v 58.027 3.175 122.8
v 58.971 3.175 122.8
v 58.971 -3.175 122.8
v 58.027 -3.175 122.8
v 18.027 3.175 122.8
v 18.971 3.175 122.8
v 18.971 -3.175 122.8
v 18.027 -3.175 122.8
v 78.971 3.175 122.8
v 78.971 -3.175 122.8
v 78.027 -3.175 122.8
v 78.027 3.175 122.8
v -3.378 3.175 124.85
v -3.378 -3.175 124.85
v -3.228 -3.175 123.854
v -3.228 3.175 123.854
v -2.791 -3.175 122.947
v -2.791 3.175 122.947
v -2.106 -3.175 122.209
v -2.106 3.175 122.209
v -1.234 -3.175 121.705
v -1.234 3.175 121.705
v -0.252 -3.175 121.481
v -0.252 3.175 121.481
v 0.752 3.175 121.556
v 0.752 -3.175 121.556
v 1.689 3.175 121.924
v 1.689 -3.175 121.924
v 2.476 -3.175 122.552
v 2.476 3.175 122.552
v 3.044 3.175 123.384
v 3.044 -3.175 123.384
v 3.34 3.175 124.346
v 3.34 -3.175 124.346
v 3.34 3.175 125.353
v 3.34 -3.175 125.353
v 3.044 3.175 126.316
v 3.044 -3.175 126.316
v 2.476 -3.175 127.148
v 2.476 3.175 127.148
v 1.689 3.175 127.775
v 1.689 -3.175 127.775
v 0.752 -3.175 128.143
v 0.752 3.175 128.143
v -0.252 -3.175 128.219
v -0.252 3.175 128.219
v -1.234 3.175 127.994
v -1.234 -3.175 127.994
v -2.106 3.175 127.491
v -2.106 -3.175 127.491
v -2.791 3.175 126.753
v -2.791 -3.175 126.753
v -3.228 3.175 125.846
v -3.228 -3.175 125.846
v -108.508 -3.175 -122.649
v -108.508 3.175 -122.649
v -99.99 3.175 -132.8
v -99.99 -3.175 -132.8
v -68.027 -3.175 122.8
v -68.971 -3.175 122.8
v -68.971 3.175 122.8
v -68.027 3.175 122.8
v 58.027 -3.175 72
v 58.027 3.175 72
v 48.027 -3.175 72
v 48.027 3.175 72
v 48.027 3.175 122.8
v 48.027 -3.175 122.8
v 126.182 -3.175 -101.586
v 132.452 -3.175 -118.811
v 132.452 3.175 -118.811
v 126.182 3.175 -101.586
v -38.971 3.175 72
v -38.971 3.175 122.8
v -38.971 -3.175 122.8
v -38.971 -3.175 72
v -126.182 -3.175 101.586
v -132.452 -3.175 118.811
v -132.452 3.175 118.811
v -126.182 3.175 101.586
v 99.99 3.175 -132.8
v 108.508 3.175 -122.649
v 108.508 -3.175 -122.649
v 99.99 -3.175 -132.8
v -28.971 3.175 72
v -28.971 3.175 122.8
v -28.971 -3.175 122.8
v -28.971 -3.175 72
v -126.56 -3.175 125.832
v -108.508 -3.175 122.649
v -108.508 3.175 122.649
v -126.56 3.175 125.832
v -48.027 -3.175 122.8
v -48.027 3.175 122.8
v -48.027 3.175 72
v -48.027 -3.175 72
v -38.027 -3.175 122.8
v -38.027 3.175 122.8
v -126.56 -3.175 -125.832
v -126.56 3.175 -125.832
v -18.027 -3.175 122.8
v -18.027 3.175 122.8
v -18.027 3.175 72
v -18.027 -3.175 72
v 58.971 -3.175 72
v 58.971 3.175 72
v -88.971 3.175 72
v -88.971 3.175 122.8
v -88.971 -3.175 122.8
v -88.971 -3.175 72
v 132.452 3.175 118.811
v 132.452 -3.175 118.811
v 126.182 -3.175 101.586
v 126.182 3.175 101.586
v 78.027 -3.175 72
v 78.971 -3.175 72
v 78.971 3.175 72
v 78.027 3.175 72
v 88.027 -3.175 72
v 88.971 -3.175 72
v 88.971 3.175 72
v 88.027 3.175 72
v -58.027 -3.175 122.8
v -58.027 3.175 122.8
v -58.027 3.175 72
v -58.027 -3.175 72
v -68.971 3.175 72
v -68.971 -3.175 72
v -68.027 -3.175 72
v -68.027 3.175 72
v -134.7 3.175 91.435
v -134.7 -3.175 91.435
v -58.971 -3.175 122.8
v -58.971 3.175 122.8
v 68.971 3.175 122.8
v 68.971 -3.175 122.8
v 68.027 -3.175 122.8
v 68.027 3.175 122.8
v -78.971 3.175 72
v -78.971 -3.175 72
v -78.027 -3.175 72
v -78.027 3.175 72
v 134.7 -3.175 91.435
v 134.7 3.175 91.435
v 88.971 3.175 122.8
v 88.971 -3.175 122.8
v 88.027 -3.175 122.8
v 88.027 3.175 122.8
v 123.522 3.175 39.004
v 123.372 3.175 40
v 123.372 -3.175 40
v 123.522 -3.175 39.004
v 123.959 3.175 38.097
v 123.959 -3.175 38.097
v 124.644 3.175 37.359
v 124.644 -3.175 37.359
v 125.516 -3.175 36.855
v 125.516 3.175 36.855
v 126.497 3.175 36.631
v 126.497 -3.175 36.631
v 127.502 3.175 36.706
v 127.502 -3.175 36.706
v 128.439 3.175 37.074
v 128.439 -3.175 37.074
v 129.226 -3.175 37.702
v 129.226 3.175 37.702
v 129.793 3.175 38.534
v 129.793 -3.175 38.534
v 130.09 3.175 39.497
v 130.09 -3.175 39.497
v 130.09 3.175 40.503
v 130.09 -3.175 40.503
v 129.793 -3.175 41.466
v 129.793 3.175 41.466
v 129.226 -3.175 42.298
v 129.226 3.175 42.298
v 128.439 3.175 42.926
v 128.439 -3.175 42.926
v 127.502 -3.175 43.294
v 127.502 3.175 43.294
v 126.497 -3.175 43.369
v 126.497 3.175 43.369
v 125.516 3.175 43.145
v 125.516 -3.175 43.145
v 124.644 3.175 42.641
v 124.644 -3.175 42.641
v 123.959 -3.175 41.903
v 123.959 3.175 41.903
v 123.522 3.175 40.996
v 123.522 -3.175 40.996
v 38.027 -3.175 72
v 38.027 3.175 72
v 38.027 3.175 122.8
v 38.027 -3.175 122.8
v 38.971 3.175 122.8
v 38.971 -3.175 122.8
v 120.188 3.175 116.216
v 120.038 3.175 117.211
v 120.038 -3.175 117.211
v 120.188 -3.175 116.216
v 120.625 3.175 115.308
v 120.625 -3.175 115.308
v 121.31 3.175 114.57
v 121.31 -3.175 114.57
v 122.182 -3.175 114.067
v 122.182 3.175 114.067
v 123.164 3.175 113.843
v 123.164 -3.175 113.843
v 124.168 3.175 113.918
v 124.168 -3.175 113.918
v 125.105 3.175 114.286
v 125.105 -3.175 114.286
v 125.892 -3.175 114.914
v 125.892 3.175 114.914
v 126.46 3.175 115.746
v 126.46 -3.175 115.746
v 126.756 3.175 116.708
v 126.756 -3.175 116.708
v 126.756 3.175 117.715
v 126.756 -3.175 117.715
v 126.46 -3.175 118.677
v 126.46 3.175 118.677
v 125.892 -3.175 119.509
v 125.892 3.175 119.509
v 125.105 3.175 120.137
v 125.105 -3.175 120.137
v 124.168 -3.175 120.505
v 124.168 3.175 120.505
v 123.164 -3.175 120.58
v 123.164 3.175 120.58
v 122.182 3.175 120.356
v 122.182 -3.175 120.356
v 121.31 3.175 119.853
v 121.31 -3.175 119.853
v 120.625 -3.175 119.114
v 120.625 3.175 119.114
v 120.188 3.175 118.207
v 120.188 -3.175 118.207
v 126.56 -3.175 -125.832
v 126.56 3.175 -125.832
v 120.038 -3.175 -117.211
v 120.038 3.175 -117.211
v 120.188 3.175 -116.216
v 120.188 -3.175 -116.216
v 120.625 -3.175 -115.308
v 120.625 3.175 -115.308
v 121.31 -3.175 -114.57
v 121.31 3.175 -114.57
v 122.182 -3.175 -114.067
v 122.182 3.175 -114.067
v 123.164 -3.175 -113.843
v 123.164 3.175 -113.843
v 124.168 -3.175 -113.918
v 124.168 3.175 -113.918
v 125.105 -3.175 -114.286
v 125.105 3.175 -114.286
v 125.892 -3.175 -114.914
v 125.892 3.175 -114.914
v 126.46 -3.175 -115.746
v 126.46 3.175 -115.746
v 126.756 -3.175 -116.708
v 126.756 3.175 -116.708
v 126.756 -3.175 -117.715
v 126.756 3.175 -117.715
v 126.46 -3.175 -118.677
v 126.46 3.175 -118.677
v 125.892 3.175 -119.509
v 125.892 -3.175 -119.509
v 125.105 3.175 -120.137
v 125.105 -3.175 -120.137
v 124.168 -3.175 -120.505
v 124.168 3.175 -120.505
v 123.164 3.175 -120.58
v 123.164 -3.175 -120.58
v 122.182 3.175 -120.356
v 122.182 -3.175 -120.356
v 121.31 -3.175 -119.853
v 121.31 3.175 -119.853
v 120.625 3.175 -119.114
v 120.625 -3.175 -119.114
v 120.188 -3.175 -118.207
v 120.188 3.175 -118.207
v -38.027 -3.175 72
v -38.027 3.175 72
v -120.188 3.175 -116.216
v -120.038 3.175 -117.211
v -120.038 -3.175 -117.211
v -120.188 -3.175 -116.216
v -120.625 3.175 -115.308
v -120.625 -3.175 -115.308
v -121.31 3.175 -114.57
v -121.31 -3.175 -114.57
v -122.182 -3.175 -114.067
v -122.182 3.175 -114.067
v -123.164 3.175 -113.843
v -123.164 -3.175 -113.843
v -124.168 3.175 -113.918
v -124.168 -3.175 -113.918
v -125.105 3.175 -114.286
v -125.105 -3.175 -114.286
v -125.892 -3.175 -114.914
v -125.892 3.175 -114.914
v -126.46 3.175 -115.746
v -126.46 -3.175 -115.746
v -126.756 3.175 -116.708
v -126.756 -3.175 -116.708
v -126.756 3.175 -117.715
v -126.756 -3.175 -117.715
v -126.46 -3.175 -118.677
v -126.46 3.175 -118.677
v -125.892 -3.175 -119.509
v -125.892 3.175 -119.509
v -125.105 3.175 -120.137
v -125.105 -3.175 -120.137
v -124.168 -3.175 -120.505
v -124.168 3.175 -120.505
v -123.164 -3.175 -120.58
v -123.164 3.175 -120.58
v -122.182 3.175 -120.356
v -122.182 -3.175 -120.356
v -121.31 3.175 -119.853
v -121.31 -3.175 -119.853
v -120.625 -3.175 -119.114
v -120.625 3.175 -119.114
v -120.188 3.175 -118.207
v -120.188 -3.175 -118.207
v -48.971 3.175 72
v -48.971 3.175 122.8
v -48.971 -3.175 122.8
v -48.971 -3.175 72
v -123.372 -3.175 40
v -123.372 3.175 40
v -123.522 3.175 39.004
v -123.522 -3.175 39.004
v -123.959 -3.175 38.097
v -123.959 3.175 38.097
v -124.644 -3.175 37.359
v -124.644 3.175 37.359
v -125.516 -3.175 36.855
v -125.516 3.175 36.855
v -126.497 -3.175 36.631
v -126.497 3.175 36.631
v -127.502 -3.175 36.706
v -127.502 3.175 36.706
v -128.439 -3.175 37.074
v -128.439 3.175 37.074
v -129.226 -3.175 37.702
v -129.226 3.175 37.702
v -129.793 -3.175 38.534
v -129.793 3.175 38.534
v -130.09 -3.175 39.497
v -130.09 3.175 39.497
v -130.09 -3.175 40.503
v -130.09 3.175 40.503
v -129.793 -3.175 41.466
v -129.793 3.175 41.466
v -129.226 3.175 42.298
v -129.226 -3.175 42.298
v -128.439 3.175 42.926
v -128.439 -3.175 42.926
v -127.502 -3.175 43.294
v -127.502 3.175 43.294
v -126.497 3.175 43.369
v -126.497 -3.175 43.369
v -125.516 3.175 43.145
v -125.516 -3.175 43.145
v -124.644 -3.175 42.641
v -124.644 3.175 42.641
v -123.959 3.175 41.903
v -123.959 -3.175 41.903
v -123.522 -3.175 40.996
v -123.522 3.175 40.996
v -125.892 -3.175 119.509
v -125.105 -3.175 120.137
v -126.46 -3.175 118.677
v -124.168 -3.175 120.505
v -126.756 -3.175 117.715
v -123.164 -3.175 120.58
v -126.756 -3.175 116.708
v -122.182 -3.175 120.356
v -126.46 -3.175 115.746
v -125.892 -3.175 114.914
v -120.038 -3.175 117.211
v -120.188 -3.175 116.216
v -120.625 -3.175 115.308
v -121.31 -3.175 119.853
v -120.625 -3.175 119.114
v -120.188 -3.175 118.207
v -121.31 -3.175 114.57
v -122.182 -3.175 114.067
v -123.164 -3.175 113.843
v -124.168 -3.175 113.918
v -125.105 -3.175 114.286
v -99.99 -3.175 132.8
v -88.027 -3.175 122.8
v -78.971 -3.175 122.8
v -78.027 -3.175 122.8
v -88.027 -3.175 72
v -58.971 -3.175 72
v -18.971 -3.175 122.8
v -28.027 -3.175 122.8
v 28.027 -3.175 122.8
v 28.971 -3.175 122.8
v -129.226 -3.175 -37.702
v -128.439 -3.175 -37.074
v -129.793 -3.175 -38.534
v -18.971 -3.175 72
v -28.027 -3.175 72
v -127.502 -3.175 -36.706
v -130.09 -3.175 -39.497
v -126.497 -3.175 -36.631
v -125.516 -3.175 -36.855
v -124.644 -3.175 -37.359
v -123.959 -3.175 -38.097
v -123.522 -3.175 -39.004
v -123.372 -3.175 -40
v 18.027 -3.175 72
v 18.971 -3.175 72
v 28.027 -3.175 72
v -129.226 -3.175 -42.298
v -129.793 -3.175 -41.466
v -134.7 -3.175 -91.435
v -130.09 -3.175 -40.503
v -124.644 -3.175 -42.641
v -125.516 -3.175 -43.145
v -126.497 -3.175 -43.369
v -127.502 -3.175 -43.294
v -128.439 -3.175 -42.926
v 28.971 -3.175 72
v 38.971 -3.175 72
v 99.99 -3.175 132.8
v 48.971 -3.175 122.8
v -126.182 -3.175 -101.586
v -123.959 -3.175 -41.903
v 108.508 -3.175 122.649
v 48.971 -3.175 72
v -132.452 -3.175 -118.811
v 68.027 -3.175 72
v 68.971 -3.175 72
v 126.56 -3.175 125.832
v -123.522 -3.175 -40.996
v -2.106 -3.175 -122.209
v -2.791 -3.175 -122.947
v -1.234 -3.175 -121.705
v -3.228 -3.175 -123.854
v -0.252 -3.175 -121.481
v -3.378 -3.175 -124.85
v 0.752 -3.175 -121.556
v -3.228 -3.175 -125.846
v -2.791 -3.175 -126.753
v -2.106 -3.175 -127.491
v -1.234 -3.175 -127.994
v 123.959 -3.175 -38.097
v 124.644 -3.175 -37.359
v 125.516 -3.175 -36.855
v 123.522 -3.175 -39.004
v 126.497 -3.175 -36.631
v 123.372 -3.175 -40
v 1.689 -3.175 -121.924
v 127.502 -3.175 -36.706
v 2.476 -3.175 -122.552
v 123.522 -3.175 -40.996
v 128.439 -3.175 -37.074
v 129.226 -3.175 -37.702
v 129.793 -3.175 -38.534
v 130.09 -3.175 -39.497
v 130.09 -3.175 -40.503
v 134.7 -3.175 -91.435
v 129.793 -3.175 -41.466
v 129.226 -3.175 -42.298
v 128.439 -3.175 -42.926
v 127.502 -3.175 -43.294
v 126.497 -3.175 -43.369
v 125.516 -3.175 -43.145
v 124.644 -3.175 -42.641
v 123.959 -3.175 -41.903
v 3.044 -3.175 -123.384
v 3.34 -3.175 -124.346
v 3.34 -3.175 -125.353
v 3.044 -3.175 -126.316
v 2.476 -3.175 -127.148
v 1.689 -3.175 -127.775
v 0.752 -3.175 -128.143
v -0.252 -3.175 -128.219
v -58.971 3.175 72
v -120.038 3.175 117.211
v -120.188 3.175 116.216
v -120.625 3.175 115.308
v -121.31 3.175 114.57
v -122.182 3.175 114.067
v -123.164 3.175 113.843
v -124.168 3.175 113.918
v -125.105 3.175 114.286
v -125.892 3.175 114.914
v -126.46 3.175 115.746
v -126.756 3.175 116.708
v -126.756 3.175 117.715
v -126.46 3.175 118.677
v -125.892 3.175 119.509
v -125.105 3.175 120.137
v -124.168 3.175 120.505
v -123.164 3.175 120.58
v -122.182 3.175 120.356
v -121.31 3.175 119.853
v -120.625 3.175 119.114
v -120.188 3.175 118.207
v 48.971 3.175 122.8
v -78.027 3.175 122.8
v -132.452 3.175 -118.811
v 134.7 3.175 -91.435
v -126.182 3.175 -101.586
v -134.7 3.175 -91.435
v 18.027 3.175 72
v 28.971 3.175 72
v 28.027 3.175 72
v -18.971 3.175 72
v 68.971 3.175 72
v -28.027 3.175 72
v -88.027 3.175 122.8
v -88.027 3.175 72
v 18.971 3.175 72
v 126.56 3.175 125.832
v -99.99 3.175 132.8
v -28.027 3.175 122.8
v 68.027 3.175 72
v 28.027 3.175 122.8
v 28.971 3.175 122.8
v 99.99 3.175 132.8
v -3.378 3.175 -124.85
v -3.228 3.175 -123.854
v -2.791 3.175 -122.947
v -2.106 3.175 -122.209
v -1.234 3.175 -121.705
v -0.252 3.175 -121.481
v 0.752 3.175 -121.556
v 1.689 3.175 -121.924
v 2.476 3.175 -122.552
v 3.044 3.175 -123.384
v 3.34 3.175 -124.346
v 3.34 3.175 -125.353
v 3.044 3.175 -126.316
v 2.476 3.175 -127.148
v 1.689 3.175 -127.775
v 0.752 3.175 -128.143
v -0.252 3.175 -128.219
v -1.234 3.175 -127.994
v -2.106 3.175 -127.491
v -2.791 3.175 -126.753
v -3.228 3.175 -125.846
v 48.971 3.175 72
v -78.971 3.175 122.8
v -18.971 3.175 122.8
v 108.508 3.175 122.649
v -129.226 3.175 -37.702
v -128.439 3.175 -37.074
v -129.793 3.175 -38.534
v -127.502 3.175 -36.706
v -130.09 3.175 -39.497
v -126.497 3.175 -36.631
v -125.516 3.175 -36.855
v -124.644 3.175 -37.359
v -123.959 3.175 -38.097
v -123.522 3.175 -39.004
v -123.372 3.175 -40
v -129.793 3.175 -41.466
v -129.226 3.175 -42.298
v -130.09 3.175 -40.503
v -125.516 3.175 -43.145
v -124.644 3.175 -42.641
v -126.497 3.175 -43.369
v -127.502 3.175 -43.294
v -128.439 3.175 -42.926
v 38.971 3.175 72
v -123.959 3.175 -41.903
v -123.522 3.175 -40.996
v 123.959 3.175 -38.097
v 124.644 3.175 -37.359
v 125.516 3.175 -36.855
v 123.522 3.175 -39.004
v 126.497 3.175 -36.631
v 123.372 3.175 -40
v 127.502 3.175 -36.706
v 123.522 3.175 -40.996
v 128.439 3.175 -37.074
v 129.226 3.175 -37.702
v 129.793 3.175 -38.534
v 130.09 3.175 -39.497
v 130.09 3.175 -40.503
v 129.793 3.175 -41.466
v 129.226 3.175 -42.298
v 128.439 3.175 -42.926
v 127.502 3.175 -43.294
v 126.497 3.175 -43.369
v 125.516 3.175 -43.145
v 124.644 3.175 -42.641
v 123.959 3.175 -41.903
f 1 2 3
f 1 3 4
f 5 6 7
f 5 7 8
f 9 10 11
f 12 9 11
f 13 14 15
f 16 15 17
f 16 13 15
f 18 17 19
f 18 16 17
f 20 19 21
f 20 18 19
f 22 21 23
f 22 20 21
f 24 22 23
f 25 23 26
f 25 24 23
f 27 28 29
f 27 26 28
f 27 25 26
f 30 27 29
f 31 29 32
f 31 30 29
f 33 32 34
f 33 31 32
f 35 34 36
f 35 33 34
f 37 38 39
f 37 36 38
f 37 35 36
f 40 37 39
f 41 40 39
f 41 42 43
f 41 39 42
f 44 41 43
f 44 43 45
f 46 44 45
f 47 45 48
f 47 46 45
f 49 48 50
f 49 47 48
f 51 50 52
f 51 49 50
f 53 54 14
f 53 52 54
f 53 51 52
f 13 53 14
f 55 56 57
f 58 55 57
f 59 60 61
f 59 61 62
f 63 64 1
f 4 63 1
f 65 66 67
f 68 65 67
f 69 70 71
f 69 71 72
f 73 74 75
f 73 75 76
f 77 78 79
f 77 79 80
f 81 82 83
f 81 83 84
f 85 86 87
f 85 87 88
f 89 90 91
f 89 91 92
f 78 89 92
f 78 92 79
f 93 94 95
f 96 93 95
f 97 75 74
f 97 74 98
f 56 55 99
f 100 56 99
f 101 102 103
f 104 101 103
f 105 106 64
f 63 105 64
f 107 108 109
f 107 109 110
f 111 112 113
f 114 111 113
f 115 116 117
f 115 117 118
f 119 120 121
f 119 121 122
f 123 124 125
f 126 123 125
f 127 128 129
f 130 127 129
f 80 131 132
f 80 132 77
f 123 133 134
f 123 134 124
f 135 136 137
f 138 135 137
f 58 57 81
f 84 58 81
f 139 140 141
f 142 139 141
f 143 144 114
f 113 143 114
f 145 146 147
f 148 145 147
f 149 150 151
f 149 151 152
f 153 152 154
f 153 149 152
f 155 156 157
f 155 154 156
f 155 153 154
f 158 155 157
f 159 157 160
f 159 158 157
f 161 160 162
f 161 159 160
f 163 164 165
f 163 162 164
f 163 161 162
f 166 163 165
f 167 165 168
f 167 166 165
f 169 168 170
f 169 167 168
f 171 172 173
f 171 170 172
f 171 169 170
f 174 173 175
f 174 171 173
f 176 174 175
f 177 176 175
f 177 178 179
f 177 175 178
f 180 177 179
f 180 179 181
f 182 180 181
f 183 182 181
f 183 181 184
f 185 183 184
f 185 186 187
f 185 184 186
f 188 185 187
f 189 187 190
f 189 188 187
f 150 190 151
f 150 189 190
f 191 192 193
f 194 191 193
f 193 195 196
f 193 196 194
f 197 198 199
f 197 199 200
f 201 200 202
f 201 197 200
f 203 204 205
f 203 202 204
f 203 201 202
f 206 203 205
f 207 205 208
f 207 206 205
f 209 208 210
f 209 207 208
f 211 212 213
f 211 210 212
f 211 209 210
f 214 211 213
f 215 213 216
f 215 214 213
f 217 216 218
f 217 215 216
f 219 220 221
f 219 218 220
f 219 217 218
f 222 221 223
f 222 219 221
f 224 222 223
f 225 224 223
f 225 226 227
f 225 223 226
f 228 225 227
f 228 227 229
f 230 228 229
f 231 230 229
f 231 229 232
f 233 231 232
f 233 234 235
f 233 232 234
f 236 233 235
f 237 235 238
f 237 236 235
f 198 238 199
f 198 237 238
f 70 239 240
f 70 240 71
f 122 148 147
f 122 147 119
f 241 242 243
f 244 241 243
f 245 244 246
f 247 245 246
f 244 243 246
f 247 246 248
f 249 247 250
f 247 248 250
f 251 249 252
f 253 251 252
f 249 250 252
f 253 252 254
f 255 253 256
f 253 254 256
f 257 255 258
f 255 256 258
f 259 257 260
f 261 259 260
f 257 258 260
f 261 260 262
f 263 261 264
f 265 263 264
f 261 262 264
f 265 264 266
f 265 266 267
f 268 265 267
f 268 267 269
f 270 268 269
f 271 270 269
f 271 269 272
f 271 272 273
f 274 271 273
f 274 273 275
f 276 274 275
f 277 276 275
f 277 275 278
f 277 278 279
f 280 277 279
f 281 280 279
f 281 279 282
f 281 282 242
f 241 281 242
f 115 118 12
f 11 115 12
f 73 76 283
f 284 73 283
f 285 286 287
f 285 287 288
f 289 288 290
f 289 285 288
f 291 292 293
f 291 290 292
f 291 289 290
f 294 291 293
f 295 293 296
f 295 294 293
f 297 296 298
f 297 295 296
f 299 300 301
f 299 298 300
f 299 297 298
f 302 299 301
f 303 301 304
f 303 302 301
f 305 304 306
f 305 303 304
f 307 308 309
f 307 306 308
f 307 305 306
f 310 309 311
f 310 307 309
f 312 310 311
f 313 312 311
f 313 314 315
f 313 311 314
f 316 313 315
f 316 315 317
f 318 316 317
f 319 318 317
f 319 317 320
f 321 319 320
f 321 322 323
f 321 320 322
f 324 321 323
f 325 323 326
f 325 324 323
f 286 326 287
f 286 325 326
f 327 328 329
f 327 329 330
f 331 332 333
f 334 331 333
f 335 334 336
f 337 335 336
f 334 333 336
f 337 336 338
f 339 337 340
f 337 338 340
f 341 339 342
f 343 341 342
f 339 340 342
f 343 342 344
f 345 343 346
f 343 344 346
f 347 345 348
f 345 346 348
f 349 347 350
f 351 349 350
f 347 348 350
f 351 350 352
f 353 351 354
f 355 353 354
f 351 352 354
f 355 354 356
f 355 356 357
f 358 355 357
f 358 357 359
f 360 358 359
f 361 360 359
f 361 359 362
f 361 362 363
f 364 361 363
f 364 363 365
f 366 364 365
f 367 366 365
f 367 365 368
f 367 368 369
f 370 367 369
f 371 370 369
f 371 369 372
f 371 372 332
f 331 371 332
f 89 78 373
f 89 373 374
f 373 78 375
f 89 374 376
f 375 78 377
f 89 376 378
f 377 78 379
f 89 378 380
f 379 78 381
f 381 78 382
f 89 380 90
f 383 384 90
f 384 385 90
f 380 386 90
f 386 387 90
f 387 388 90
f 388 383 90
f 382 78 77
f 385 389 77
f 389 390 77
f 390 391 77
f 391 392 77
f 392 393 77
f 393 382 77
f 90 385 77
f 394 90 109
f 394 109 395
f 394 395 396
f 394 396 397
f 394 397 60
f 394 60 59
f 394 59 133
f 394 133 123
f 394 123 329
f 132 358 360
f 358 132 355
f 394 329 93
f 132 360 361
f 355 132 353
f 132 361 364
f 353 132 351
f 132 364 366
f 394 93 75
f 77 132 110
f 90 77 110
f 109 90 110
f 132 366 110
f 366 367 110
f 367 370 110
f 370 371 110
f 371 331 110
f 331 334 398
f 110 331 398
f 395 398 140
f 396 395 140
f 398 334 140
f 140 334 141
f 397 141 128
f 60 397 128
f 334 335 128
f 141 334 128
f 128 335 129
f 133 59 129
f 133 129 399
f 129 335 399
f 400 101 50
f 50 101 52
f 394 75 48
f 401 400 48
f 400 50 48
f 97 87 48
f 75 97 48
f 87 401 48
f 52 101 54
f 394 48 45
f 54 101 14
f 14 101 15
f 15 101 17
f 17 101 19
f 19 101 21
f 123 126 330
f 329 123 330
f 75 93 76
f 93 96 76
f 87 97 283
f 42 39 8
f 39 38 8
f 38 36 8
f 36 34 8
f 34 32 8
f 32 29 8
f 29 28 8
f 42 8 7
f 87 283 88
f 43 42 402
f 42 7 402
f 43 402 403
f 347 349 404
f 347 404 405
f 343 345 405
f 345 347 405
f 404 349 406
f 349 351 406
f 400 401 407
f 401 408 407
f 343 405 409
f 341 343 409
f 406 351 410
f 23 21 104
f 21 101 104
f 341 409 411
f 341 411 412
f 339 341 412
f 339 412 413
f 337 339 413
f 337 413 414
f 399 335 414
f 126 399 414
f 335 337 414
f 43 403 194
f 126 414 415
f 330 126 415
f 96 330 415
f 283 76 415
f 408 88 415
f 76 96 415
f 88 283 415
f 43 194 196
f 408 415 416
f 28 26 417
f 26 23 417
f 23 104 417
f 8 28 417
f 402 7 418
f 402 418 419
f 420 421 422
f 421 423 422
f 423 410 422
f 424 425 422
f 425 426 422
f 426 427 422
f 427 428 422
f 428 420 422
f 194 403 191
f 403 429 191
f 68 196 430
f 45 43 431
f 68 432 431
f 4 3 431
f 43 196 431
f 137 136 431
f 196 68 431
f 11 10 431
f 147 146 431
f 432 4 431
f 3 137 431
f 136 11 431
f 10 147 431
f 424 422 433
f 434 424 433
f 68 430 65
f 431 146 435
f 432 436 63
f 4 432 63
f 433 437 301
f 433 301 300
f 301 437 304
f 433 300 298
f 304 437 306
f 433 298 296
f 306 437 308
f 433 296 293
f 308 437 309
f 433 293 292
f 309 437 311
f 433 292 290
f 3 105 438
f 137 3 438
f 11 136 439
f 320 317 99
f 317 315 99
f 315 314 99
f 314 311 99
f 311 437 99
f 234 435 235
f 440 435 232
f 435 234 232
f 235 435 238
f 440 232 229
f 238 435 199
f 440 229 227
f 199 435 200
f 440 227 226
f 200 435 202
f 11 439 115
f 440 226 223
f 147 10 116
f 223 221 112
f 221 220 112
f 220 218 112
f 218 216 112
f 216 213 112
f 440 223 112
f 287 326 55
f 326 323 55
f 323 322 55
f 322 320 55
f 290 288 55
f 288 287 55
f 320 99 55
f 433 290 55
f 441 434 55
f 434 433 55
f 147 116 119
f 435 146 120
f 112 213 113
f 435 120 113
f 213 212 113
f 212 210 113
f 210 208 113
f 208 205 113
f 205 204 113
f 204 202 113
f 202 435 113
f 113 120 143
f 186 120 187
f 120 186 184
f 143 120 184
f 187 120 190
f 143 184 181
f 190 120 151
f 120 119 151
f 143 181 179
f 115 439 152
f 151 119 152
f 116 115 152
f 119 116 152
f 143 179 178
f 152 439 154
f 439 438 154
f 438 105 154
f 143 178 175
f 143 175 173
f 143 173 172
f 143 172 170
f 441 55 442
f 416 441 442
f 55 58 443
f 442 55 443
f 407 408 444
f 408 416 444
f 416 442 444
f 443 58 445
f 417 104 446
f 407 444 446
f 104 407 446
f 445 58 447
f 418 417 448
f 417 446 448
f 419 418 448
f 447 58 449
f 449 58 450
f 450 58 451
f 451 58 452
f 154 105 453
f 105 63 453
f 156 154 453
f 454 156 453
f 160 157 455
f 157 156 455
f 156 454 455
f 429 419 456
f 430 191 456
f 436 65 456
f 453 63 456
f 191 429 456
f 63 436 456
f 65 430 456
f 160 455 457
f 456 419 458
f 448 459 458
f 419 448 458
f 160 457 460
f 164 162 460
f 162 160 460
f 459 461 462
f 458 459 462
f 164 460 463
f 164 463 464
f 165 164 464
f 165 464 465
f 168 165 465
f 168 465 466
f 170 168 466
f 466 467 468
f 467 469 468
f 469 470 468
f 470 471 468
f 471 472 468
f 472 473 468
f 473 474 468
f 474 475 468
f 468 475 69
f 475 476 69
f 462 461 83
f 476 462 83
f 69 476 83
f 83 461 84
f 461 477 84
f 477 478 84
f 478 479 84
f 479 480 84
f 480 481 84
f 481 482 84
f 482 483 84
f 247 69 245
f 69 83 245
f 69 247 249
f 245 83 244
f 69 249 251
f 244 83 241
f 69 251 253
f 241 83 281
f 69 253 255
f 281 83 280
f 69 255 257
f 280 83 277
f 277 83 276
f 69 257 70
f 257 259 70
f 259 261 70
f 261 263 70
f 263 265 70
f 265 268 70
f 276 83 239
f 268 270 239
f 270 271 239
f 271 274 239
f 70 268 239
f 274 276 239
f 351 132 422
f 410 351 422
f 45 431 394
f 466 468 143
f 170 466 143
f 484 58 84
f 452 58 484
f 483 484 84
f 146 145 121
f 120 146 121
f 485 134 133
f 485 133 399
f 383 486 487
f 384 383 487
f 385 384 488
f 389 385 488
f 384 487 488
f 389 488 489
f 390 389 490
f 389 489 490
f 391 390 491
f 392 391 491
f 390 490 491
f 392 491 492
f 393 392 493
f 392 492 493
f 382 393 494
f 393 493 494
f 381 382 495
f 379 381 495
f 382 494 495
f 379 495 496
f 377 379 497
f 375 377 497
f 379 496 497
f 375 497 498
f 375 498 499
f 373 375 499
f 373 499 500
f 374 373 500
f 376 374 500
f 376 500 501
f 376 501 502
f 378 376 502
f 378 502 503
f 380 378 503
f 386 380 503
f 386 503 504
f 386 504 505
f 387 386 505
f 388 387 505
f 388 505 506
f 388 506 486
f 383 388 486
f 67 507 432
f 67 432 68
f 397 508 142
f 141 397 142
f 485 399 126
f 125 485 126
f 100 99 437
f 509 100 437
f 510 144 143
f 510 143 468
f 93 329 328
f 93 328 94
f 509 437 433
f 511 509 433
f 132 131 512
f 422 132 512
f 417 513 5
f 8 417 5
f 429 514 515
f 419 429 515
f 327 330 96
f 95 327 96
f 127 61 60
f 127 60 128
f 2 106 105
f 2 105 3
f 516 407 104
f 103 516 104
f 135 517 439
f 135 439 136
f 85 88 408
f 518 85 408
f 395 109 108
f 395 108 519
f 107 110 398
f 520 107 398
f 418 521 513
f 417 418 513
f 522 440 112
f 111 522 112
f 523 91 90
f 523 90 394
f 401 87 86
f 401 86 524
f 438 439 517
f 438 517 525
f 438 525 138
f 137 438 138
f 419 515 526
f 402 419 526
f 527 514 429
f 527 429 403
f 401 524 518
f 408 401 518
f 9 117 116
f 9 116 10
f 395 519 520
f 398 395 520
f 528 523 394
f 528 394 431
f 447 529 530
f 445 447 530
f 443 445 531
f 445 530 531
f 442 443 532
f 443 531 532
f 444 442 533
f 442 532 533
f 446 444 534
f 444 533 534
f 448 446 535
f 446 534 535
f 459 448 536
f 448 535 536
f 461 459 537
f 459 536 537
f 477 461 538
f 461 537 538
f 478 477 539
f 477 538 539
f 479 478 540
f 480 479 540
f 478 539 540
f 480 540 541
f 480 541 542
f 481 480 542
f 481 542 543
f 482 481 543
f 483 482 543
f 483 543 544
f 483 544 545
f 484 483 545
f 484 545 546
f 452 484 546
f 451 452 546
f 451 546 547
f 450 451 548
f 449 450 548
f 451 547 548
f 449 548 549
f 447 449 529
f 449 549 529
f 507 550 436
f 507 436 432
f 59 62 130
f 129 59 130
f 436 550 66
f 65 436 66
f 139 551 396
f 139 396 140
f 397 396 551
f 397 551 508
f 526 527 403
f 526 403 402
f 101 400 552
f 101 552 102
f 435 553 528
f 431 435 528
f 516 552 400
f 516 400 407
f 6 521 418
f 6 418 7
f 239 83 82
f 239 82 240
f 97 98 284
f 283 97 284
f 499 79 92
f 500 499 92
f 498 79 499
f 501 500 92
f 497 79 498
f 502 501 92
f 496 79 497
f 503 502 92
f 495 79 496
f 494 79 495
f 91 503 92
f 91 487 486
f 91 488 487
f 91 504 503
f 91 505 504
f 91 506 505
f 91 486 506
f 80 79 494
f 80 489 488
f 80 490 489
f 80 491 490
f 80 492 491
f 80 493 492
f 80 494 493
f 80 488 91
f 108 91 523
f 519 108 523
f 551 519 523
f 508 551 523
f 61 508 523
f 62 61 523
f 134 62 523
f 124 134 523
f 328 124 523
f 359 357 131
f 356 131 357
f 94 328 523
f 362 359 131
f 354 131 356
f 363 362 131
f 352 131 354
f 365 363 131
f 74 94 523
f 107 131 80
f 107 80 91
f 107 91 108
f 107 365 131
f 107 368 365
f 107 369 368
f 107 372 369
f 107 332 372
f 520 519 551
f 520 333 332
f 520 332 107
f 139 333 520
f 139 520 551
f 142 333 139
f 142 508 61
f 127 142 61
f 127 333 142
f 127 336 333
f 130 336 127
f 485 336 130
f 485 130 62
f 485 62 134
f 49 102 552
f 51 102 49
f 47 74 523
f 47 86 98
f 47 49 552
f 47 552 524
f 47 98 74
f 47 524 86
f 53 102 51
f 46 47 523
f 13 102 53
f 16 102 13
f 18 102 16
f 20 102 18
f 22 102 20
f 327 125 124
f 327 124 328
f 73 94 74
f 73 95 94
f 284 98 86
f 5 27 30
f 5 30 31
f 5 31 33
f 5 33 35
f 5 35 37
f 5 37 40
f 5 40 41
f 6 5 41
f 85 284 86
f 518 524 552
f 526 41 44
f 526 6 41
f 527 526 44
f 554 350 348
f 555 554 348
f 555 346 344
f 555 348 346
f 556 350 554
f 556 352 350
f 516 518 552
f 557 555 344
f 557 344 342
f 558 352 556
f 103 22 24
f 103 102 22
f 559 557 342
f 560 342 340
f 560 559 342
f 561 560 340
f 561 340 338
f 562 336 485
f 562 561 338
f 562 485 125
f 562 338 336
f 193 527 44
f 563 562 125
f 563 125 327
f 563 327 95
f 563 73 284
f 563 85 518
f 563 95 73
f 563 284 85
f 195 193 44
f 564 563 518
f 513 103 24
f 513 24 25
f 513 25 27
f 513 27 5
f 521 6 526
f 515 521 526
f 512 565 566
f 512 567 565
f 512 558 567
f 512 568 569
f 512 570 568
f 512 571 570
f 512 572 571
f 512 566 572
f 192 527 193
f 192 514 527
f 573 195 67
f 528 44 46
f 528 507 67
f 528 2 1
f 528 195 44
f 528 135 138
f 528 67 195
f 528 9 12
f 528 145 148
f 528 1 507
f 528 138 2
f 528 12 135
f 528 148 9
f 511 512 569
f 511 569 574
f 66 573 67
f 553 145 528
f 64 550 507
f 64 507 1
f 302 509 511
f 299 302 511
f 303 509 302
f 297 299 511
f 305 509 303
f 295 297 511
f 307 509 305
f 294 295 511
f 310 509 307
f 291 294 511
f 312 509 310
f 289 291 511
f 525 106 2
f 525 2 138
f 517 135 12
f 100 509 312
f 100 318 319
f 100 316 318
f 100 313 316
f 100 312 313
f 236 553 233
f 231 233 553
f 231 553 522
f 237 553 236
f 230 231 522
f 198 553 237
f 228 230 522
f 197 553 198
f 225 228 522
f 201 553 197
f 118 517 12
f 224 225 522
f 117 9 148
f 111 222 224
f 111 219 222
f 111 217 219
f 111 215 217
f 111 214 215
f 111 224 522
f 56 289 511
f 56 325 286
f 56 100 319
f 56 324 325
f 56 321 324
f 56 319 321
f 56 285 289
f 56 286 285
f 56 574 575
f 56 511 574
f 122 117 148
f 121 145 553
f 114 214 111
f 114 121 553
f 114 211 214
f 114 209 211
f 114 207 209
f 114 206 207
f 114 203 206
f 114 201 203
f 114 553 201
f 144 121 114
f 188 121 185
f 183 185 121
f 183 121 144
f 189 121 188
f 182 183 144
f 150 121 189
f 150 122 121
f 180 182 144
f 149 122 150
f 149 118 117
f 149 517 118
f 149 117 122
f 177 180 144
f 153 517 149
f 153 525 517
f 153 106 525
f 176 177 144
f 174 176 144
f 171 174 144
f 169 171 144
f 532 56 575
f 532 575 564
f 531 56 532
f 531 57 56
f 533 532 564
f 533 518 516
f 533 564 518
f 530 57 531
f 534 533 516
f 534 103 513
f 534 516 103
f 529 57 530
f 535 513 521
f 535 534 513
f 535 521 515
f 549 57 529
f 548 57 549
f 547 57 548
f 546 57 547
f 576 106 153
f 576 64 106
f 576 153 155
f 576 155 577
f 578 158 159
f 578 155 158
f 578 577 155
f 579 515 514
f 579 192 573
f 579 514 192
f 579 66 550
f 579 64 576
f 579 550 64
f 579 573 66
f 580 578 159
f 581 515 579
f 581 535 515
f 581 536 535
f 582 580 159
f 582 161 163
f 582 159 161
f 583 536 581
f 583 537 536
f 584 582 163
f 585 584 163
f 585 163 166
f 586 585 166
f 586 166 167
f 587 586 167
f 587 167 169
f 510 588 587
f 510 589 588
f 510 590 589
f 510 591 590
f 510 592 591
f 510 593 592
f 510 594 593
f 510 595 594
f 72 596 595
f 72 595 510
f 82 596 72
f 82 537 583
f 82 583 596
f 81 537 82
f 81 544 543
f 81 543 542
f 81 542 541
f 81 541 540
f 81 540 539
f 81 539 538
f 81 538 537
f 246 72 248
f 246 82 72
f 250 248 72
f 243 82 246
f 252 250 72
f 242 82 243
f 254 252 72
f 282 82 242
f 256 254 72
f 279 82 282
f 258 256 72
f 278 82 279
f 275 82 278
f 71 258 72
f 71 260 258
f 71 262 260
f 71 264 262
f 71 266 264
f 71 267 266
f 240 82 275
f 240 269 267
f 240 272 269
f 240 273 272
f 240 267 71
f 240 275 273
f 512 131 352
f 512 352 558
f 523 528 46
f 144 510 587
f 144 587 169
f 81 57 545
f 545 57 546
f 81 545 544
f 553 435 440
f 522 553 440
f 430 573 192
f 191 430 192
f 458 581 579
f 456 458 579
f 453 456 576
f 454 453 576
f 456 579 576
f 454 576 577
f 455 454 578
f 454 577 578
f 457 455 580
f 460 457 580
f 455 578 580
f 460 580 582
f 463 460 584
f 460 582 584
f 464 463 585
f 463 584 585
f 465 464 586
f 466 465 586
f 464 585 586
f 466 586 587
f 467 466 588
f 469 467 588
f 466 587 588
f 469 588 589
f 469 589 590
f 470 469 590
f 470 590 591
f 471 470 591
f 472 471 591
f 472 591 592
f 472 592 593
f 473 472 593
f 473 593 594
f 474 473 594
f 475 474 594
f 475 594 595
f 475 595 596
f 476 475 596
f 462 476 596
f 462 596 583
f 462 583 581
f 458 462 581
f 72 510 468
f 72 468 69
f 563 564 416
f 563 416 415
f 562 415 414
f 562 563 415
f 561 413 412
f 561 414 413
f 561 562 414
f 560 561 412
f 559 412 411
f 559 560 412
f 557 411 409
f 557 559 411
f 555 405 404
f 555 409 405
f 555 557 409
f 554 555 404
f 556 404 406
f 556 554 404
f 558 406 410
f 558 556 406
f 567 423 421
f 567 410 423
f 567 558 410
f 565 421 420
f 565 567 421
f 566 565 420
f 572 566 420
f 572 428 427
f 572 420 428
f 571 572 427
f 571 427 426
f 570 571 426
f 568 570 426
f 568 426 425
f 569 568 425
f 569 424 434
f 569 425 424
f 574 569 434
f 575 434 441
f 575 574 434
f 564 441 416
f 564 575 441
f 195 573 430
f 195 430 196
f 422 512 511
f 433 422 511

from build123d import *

# Parameters (mm, degrees)
SKETCH1_W               = 269.4
SKETCH1_H               = 265.6
BOSS_EXTRUDE1_DEPTH     = 3.175
CUT_EXTRUDE3_DEPTH      = 190.262390612
BOSS_EXTRUDE3_DEPTH     = 6.35
F_1_4_CLEARANCE_HOLE1_D = 6.7564
MIRROR2_COPY_1_DEPTH    = 6.35
MIRROR2_COPY_2_D        = 6.7564
CUT_EXTRUDE2_REACH      = 191.262
SKETCH15_W              = 0.944
SKETCH15_H              = 50.8
LPATTERN1_COUNT         = 8
LPATTERN1_PITCH         = 10
MIRROR3_COPY_1_REACH    = 191.262
MIRROR3_COPY_1_SKETCH_W = 0.944
MIRROR3_COPY_1_SKETCH_H = 50.8
MIRROR3_COPY_2_REACH    = 191.262
MIRROR3_COPY_2_SKETCH_W = 0.944
MIRROR3_COPY_2_SKETCH_H = 50.8
MIRROR3_COPY_3_REACH    = 191.262
MIRROR3_COPY_3_SKETCH_W = 0.944
MIRROR3_COPY_3_SKETCH_H = 50.8
MIRROR3_COPY_4_REACH    = 191.262
MIRROR3_COPY_4_SKETCH_W = 0.944
MIRROR3_COPY_4_SKETCH_H = 50.8
MIRROR3_COPY_5_REACH    = 191.262
MIRROR3_COPY_5_SKETCH_W = 0.944
MIRROR3_COPY_5_SKETCH_H = 50.8
MIRROR3_COPY_6_REACH    = 191.262
MIRROR3_COPY_6_SKETCH_W = 0.944
MIRROR3_COPY_6_SKETCH_H = 50.8
MIRROR3_COPY_7_REACH    = 191.262
MIRROR3_COPY_7_SKETCH_W = 0.944
MIRROR3_COPY_7_SKETCH_H = 50.8


with BuildPart() as part:
    # Sketch1 → Boss-Extrude1 (new, symmetric)
    with BuildSketch(Plane(origin=(0, 0, 0), x_dir=(1, 0, 0), z_dir=(0, 1, 0))):
        Rectangle(SKETCH1_W, SKETCH1_H)
    extrude(amount=BOSS_EXTRUDE1_DEPTH, both=True)

    # Sketch16 → Cut-Extrude3 (cut, through all)
    with BuildSketch(Plane(origin=(0, 3.175, 0), x_dir=(1, 0, 0), z_dir=(0, 1, 0))):
        Polygon((-134.7, 132.8), (-134.7, 91.434816919), (-99.990490133, 132.8), align=None)
        Polygon((99.990490133, 132.8), (134.7, 132.8), (134.7, 91.434816919), align=None)
        Polygon((134.7, -132.8), (134.7, -91.434816919), (99.990490133, -132.8), align=None)
        Polygon((-99.990490133, -132.8), (-134.7, -132.8), (-134.7, -91.434816919), align=None)
    extrude(amount=-CUT_EXTRUDE3_DEPTH, mode=Mode.SUBTRACT)

    # Sketch7 → Boss-Extrude3 (add)
    with BuildSketch(Plane(origin=(0, -3.175, 0), x_dir=(1, 0, 0), z_dir=(0, 1, 0))):
        Polygon((126.560486405, 125.832227239), (132.451914797, 118.811096288), (126.182387654, 101.585712032), (108.508102479, 122.649104887), align=None)
    boss_extrude3 = extrude(amount=BOSS_EXTRUDE3_DEPTH)

    # 1/4 Clearance Hole1 (through all)
    with Locations(Plane.XZ.offset(3.175)):
        with Locations((123.415994069, -117.211371709), (126.7498, -40), (0, -124.8498)):
            f_1_4_clearance_hole1 = Hole(F_1_4_CLEARANCE_HOLE1_D / 2)

    # Mirror1: Boss-Extrude3, 1/4 Clearance Hole1 across plane
    add(boss_extrude3.mirror(Plane.XY))
    add(f_1_4_clearance_hole1.mirror(Plane.XY), mode=Mode.SUBTRACT)

    # Mirror2: Boss-Extrude3, 1/4 Clearance Hole1 across plane
    add(boss_extrude3.mirror(Plane(origin=(0, 0, 0), x_dir=(0, 0, 1), z_dir=(1, 0, 0))))
    add(f_1_4_clearance_hole1.mirror(Plane(origin=(0, 0, 0), x_dir=(0, 0, 1), z_dir=(1, 0, 0))), mode=Mode.SUBTRACT)

    # Mirror2 copy 1 sketch → Mirror2 copy 1 (add)
    with BuildSketch(Plane(origin=(0, -3.175, 0), x_dir=(-1, 0, 0), z_dir=(0, 1, 0))):
        Polygon((126.560486405, 125.832227239), (132.451914797, 118.811096288), (126.182387654, 101.585712032), (108.508102479, 122.649104887), align=None)
    extrude(amount=MIRROR2_COPY_1_DEPTH)

    # Mirror2 copy 2 (through all)
    with Locations(Plane(origin=(0, -3.175, 0), x_dir=(-1, 0, 0), z_dir=(0, -1, 0))):
        with Locations((123.415994069, -117.211371709), (126.7498, -40), (0, -124.8498)):
            Hole(MIRROR2_COPY_2_D / 2)

    # Sketch15 → Cut-Extrude2 (cut, up to next)
    with BuildSketch(Plane(origin=(0, 3.175, 0), x_dir=(1, 0, 0), z_dir=(0, 1, 0)), mode=Mode.PRIVATE) as cut_extrude2_sk1:
        with Locations((-88.499, -97.4)):
            Rectangle(SKETCH15_W, SKETCH15_H)
    cut_extrude2_tool1 = extrude(cut_extrude2_sk1.sketch, amount=-CUT_EXTRUDE2_REACH, mode=Mode.PRIVATE) & part.part
    cut_extrude2 = cut_extrude2_tool1.solids().sort_by_distance((-88.499, 3.175, 97.4))[0]
    add(cut_extrude2, mode=Mode.SUBTRACT)

    # LPattern1: Cut-Extrude2 ×8
    with Locations(*[(i * LPATTERN1_PITCH, 0, 0) for i in range(1, LPATTERN1_COUNT)]):
        add(cut_extrude2, mode=Mode.SUBTRACT)

    # Mirror3: Cut-Extrude2 across plane
    add(cut_extrude2.mirror(Plane(origin=(0, 0, 0), x_dir=(0, 0, 1), z_dir=(1, 0, 0))), mode=Mode.SUBTRACT)

    # Mirror3 copy 1 sketch → Mirror3 copy 1 (cut, up to next)
    with BuildSketch(Plane(origin=(-10, 3.175, 0), x_dir=(-1, 0, 0), z_dir=(0, 1, 0)), mode=Mode.PRIVATE) as mirror3_copy_1_sk1:
        with Locations((-88.499, 97.4)):
            Rectangle(MIRROR3_COPY_1_SKETCH_W, MIRROR3_COPY_1_SKETCH_H)
    mirror3_copy_1_tool1 = extrude(mirror3_copy_1_sk1.sketch, amount=-MIRROR3_COPY_1_REACH, mode=Mode.PRIVATE) & part.part
    add(mirror3_copy_1_tool1.solids().sort_by_distance((78.499, 3.175, 97.4))[0], mode=Mode.SUBTRACT)

    # Mirror3 copy 2 sketch → Mirror3 copy 2 (cut, up to next)
    with BuildSketch(Plane(origin=(-20, 3.175, 0), x_dir=(-1, 0, 0), z_dir=(0, 1, 0)), mode=Mode.PRIVATE) as mirror3_copy_2_sk1:
        with Locations((-88.499, 97.4)):
            Rectangle(MIRROR3_COPY_2_SKETCH_W, MIRROR3_COPY_2_SKETCH_H)
    mirror3_copy_2_tool1 = extrude(mirror3_copy_2_sk1.sketch, amount=-MIRROR3_COPY_2_REACH, mode=Mode.PRIVATE) & part.part
    add(mirror3_copy_2_tool1.solids().sort_by_distance((68.499, 3.175, 97.4))[0], mode=Mode.SUBTRACT)

    # Mirror3 copy 3 sketch → Mirror3 copy 3 (cut, up to next)
    with BuildSketch(Plane(origin=(-30, 3.175, 0), x_dir=(-1, 0, 0), z_dir=(0, 1, 0)), mode=Mode.PRIVATE) as mirror3_copy_3_sk1:
        with Locations((-88.499, 97.4)):
            Rectangle(MIRROR3_COPY_3_SKETCH_W, MIRROR3_COPY_3_SKETCH_H)
    mirror3_copy_3_tool1 = extrude(mirror3_copy_3_sk1.sketch, amount=-MIRROR3_COPY_3_REACH, mode=Mode.PRIVATE) & part.part
    add(mirror3_copy_3_tool1.solids().sort_by_distance((58.499, 3.175, 97.4))[0], mode=Mode.SUBTRACT)

    # Mirror3 copy 4 sketch → Mirror3 copy 4 (cut, up to next)
    with BuildSketch(Plane(origin=(-40, 3.175, 0), x_dir=(-1, 0, 0), z_dir=(0, 1, 0)), mode=Mode.PRIVATE) as mirror3_copy_4_sk1:
        with Locations((-88.499, 97.4)):
            Rectangle(MIRROR3_COPY_4_SKETCH_W, MIRROR3_COPY_4_SKETCH_H)
    mirror3_copy_4_tool1 = extrude(mirror3_copy_4_sk1.sketch, amount=-MIRROR3_COPY_4_REACH, mode=Mode.PRIVATE) & part.part
    add(mirror3_copy_4_tool1.solids().sort_by_distance((48.499, 3.175, 97.4))[0], mode=Mode.SUBTRACT)

    # Mirror3 copy 5 sketch → Mirror3 copy 5 (cut, up to next)
    with BuildSketch(Plane(origin=(-50, 3.175, 0), x_dir=(-1, 0, 0), z_dir=(0, 1, 0)), mode=Mode.PRIVATE) as mirror3_copy_5_sk1:
        with Locations((-88.499, 97.4)):
            Rectangle(MIRROR3_COPY_5_SKETCH_W, MIRROR3_COPY_5_SKETCH_H)
    mirror3_copy_5_tool1 = extrude(mirror3_copy_5_sk1.sketch, amount=-MIRROR3_COPY_5_REACH, mode=Mode.PRIVATE) & part.part
    add(mirror3_copy_5_tool1.solids().sort_by_distance((38.499, 3.175, 97.4))[0], mode=Mode.SUBTRACT)

    # Mirror3 copy 6 sketch → Mirror3 copy 6 (cut, up to next)
    with BuildSketch(Plane(origin=(-60, 3.175, 0), x_dir=(-1, 0, 0), z_dir=(0, 1, 0)), mode=Mode.PRIVATE) as mirror3_copy_6_sk1:
        with Locations((-88.499, 97.4)):
            Rectangle(MIRROR3_COPY_6_SKETCH_W, MIRROR3_COPY_6_SKETCH_H)
    mirror3_copy_6_tool1 = extrude(mirror3_copy_6_sk1.sketch, amount=-MIRROR3_COPY_6_REACH, mode=Mode.PRIVATE) & part.part
    add(mirror3_copy_6_tool1.solids().sort_by_distance((28.499, 3.175, 97.4))[0], mode=Mode.SUBTRACT)

    # Mirror3 copy 7 sketch → Mirror3 copy 7 (cut, up to next)
    with BuildSketch(Plane(origin=(-70, 3.175, 0), x_dir=(-1, 0, 0), z_dir=(0, 1, 0)), mode=Mode.PRIVATE) as mirror3_copy_7_sk1:
        with Locations((-88.499, 97.4)):
            Rectangle(MIRROR3_COPY_7_SKETCH_W, MIRROR3_COPY_7_SKETCH_H)
    mirror3_copy_7_tool1 = extrude(mirror3_copy_7_sk1.sketch, amount=-MIRROR3_COPY_7_REACH, mode=Mode.PRIVATE) & part.part
    add(mirror3_copy_7_tool1.solids().sort_by_distance((18.499, 3.175, 97.4))[0], mode=Mode.SUBTRACT)


solid = part.part
